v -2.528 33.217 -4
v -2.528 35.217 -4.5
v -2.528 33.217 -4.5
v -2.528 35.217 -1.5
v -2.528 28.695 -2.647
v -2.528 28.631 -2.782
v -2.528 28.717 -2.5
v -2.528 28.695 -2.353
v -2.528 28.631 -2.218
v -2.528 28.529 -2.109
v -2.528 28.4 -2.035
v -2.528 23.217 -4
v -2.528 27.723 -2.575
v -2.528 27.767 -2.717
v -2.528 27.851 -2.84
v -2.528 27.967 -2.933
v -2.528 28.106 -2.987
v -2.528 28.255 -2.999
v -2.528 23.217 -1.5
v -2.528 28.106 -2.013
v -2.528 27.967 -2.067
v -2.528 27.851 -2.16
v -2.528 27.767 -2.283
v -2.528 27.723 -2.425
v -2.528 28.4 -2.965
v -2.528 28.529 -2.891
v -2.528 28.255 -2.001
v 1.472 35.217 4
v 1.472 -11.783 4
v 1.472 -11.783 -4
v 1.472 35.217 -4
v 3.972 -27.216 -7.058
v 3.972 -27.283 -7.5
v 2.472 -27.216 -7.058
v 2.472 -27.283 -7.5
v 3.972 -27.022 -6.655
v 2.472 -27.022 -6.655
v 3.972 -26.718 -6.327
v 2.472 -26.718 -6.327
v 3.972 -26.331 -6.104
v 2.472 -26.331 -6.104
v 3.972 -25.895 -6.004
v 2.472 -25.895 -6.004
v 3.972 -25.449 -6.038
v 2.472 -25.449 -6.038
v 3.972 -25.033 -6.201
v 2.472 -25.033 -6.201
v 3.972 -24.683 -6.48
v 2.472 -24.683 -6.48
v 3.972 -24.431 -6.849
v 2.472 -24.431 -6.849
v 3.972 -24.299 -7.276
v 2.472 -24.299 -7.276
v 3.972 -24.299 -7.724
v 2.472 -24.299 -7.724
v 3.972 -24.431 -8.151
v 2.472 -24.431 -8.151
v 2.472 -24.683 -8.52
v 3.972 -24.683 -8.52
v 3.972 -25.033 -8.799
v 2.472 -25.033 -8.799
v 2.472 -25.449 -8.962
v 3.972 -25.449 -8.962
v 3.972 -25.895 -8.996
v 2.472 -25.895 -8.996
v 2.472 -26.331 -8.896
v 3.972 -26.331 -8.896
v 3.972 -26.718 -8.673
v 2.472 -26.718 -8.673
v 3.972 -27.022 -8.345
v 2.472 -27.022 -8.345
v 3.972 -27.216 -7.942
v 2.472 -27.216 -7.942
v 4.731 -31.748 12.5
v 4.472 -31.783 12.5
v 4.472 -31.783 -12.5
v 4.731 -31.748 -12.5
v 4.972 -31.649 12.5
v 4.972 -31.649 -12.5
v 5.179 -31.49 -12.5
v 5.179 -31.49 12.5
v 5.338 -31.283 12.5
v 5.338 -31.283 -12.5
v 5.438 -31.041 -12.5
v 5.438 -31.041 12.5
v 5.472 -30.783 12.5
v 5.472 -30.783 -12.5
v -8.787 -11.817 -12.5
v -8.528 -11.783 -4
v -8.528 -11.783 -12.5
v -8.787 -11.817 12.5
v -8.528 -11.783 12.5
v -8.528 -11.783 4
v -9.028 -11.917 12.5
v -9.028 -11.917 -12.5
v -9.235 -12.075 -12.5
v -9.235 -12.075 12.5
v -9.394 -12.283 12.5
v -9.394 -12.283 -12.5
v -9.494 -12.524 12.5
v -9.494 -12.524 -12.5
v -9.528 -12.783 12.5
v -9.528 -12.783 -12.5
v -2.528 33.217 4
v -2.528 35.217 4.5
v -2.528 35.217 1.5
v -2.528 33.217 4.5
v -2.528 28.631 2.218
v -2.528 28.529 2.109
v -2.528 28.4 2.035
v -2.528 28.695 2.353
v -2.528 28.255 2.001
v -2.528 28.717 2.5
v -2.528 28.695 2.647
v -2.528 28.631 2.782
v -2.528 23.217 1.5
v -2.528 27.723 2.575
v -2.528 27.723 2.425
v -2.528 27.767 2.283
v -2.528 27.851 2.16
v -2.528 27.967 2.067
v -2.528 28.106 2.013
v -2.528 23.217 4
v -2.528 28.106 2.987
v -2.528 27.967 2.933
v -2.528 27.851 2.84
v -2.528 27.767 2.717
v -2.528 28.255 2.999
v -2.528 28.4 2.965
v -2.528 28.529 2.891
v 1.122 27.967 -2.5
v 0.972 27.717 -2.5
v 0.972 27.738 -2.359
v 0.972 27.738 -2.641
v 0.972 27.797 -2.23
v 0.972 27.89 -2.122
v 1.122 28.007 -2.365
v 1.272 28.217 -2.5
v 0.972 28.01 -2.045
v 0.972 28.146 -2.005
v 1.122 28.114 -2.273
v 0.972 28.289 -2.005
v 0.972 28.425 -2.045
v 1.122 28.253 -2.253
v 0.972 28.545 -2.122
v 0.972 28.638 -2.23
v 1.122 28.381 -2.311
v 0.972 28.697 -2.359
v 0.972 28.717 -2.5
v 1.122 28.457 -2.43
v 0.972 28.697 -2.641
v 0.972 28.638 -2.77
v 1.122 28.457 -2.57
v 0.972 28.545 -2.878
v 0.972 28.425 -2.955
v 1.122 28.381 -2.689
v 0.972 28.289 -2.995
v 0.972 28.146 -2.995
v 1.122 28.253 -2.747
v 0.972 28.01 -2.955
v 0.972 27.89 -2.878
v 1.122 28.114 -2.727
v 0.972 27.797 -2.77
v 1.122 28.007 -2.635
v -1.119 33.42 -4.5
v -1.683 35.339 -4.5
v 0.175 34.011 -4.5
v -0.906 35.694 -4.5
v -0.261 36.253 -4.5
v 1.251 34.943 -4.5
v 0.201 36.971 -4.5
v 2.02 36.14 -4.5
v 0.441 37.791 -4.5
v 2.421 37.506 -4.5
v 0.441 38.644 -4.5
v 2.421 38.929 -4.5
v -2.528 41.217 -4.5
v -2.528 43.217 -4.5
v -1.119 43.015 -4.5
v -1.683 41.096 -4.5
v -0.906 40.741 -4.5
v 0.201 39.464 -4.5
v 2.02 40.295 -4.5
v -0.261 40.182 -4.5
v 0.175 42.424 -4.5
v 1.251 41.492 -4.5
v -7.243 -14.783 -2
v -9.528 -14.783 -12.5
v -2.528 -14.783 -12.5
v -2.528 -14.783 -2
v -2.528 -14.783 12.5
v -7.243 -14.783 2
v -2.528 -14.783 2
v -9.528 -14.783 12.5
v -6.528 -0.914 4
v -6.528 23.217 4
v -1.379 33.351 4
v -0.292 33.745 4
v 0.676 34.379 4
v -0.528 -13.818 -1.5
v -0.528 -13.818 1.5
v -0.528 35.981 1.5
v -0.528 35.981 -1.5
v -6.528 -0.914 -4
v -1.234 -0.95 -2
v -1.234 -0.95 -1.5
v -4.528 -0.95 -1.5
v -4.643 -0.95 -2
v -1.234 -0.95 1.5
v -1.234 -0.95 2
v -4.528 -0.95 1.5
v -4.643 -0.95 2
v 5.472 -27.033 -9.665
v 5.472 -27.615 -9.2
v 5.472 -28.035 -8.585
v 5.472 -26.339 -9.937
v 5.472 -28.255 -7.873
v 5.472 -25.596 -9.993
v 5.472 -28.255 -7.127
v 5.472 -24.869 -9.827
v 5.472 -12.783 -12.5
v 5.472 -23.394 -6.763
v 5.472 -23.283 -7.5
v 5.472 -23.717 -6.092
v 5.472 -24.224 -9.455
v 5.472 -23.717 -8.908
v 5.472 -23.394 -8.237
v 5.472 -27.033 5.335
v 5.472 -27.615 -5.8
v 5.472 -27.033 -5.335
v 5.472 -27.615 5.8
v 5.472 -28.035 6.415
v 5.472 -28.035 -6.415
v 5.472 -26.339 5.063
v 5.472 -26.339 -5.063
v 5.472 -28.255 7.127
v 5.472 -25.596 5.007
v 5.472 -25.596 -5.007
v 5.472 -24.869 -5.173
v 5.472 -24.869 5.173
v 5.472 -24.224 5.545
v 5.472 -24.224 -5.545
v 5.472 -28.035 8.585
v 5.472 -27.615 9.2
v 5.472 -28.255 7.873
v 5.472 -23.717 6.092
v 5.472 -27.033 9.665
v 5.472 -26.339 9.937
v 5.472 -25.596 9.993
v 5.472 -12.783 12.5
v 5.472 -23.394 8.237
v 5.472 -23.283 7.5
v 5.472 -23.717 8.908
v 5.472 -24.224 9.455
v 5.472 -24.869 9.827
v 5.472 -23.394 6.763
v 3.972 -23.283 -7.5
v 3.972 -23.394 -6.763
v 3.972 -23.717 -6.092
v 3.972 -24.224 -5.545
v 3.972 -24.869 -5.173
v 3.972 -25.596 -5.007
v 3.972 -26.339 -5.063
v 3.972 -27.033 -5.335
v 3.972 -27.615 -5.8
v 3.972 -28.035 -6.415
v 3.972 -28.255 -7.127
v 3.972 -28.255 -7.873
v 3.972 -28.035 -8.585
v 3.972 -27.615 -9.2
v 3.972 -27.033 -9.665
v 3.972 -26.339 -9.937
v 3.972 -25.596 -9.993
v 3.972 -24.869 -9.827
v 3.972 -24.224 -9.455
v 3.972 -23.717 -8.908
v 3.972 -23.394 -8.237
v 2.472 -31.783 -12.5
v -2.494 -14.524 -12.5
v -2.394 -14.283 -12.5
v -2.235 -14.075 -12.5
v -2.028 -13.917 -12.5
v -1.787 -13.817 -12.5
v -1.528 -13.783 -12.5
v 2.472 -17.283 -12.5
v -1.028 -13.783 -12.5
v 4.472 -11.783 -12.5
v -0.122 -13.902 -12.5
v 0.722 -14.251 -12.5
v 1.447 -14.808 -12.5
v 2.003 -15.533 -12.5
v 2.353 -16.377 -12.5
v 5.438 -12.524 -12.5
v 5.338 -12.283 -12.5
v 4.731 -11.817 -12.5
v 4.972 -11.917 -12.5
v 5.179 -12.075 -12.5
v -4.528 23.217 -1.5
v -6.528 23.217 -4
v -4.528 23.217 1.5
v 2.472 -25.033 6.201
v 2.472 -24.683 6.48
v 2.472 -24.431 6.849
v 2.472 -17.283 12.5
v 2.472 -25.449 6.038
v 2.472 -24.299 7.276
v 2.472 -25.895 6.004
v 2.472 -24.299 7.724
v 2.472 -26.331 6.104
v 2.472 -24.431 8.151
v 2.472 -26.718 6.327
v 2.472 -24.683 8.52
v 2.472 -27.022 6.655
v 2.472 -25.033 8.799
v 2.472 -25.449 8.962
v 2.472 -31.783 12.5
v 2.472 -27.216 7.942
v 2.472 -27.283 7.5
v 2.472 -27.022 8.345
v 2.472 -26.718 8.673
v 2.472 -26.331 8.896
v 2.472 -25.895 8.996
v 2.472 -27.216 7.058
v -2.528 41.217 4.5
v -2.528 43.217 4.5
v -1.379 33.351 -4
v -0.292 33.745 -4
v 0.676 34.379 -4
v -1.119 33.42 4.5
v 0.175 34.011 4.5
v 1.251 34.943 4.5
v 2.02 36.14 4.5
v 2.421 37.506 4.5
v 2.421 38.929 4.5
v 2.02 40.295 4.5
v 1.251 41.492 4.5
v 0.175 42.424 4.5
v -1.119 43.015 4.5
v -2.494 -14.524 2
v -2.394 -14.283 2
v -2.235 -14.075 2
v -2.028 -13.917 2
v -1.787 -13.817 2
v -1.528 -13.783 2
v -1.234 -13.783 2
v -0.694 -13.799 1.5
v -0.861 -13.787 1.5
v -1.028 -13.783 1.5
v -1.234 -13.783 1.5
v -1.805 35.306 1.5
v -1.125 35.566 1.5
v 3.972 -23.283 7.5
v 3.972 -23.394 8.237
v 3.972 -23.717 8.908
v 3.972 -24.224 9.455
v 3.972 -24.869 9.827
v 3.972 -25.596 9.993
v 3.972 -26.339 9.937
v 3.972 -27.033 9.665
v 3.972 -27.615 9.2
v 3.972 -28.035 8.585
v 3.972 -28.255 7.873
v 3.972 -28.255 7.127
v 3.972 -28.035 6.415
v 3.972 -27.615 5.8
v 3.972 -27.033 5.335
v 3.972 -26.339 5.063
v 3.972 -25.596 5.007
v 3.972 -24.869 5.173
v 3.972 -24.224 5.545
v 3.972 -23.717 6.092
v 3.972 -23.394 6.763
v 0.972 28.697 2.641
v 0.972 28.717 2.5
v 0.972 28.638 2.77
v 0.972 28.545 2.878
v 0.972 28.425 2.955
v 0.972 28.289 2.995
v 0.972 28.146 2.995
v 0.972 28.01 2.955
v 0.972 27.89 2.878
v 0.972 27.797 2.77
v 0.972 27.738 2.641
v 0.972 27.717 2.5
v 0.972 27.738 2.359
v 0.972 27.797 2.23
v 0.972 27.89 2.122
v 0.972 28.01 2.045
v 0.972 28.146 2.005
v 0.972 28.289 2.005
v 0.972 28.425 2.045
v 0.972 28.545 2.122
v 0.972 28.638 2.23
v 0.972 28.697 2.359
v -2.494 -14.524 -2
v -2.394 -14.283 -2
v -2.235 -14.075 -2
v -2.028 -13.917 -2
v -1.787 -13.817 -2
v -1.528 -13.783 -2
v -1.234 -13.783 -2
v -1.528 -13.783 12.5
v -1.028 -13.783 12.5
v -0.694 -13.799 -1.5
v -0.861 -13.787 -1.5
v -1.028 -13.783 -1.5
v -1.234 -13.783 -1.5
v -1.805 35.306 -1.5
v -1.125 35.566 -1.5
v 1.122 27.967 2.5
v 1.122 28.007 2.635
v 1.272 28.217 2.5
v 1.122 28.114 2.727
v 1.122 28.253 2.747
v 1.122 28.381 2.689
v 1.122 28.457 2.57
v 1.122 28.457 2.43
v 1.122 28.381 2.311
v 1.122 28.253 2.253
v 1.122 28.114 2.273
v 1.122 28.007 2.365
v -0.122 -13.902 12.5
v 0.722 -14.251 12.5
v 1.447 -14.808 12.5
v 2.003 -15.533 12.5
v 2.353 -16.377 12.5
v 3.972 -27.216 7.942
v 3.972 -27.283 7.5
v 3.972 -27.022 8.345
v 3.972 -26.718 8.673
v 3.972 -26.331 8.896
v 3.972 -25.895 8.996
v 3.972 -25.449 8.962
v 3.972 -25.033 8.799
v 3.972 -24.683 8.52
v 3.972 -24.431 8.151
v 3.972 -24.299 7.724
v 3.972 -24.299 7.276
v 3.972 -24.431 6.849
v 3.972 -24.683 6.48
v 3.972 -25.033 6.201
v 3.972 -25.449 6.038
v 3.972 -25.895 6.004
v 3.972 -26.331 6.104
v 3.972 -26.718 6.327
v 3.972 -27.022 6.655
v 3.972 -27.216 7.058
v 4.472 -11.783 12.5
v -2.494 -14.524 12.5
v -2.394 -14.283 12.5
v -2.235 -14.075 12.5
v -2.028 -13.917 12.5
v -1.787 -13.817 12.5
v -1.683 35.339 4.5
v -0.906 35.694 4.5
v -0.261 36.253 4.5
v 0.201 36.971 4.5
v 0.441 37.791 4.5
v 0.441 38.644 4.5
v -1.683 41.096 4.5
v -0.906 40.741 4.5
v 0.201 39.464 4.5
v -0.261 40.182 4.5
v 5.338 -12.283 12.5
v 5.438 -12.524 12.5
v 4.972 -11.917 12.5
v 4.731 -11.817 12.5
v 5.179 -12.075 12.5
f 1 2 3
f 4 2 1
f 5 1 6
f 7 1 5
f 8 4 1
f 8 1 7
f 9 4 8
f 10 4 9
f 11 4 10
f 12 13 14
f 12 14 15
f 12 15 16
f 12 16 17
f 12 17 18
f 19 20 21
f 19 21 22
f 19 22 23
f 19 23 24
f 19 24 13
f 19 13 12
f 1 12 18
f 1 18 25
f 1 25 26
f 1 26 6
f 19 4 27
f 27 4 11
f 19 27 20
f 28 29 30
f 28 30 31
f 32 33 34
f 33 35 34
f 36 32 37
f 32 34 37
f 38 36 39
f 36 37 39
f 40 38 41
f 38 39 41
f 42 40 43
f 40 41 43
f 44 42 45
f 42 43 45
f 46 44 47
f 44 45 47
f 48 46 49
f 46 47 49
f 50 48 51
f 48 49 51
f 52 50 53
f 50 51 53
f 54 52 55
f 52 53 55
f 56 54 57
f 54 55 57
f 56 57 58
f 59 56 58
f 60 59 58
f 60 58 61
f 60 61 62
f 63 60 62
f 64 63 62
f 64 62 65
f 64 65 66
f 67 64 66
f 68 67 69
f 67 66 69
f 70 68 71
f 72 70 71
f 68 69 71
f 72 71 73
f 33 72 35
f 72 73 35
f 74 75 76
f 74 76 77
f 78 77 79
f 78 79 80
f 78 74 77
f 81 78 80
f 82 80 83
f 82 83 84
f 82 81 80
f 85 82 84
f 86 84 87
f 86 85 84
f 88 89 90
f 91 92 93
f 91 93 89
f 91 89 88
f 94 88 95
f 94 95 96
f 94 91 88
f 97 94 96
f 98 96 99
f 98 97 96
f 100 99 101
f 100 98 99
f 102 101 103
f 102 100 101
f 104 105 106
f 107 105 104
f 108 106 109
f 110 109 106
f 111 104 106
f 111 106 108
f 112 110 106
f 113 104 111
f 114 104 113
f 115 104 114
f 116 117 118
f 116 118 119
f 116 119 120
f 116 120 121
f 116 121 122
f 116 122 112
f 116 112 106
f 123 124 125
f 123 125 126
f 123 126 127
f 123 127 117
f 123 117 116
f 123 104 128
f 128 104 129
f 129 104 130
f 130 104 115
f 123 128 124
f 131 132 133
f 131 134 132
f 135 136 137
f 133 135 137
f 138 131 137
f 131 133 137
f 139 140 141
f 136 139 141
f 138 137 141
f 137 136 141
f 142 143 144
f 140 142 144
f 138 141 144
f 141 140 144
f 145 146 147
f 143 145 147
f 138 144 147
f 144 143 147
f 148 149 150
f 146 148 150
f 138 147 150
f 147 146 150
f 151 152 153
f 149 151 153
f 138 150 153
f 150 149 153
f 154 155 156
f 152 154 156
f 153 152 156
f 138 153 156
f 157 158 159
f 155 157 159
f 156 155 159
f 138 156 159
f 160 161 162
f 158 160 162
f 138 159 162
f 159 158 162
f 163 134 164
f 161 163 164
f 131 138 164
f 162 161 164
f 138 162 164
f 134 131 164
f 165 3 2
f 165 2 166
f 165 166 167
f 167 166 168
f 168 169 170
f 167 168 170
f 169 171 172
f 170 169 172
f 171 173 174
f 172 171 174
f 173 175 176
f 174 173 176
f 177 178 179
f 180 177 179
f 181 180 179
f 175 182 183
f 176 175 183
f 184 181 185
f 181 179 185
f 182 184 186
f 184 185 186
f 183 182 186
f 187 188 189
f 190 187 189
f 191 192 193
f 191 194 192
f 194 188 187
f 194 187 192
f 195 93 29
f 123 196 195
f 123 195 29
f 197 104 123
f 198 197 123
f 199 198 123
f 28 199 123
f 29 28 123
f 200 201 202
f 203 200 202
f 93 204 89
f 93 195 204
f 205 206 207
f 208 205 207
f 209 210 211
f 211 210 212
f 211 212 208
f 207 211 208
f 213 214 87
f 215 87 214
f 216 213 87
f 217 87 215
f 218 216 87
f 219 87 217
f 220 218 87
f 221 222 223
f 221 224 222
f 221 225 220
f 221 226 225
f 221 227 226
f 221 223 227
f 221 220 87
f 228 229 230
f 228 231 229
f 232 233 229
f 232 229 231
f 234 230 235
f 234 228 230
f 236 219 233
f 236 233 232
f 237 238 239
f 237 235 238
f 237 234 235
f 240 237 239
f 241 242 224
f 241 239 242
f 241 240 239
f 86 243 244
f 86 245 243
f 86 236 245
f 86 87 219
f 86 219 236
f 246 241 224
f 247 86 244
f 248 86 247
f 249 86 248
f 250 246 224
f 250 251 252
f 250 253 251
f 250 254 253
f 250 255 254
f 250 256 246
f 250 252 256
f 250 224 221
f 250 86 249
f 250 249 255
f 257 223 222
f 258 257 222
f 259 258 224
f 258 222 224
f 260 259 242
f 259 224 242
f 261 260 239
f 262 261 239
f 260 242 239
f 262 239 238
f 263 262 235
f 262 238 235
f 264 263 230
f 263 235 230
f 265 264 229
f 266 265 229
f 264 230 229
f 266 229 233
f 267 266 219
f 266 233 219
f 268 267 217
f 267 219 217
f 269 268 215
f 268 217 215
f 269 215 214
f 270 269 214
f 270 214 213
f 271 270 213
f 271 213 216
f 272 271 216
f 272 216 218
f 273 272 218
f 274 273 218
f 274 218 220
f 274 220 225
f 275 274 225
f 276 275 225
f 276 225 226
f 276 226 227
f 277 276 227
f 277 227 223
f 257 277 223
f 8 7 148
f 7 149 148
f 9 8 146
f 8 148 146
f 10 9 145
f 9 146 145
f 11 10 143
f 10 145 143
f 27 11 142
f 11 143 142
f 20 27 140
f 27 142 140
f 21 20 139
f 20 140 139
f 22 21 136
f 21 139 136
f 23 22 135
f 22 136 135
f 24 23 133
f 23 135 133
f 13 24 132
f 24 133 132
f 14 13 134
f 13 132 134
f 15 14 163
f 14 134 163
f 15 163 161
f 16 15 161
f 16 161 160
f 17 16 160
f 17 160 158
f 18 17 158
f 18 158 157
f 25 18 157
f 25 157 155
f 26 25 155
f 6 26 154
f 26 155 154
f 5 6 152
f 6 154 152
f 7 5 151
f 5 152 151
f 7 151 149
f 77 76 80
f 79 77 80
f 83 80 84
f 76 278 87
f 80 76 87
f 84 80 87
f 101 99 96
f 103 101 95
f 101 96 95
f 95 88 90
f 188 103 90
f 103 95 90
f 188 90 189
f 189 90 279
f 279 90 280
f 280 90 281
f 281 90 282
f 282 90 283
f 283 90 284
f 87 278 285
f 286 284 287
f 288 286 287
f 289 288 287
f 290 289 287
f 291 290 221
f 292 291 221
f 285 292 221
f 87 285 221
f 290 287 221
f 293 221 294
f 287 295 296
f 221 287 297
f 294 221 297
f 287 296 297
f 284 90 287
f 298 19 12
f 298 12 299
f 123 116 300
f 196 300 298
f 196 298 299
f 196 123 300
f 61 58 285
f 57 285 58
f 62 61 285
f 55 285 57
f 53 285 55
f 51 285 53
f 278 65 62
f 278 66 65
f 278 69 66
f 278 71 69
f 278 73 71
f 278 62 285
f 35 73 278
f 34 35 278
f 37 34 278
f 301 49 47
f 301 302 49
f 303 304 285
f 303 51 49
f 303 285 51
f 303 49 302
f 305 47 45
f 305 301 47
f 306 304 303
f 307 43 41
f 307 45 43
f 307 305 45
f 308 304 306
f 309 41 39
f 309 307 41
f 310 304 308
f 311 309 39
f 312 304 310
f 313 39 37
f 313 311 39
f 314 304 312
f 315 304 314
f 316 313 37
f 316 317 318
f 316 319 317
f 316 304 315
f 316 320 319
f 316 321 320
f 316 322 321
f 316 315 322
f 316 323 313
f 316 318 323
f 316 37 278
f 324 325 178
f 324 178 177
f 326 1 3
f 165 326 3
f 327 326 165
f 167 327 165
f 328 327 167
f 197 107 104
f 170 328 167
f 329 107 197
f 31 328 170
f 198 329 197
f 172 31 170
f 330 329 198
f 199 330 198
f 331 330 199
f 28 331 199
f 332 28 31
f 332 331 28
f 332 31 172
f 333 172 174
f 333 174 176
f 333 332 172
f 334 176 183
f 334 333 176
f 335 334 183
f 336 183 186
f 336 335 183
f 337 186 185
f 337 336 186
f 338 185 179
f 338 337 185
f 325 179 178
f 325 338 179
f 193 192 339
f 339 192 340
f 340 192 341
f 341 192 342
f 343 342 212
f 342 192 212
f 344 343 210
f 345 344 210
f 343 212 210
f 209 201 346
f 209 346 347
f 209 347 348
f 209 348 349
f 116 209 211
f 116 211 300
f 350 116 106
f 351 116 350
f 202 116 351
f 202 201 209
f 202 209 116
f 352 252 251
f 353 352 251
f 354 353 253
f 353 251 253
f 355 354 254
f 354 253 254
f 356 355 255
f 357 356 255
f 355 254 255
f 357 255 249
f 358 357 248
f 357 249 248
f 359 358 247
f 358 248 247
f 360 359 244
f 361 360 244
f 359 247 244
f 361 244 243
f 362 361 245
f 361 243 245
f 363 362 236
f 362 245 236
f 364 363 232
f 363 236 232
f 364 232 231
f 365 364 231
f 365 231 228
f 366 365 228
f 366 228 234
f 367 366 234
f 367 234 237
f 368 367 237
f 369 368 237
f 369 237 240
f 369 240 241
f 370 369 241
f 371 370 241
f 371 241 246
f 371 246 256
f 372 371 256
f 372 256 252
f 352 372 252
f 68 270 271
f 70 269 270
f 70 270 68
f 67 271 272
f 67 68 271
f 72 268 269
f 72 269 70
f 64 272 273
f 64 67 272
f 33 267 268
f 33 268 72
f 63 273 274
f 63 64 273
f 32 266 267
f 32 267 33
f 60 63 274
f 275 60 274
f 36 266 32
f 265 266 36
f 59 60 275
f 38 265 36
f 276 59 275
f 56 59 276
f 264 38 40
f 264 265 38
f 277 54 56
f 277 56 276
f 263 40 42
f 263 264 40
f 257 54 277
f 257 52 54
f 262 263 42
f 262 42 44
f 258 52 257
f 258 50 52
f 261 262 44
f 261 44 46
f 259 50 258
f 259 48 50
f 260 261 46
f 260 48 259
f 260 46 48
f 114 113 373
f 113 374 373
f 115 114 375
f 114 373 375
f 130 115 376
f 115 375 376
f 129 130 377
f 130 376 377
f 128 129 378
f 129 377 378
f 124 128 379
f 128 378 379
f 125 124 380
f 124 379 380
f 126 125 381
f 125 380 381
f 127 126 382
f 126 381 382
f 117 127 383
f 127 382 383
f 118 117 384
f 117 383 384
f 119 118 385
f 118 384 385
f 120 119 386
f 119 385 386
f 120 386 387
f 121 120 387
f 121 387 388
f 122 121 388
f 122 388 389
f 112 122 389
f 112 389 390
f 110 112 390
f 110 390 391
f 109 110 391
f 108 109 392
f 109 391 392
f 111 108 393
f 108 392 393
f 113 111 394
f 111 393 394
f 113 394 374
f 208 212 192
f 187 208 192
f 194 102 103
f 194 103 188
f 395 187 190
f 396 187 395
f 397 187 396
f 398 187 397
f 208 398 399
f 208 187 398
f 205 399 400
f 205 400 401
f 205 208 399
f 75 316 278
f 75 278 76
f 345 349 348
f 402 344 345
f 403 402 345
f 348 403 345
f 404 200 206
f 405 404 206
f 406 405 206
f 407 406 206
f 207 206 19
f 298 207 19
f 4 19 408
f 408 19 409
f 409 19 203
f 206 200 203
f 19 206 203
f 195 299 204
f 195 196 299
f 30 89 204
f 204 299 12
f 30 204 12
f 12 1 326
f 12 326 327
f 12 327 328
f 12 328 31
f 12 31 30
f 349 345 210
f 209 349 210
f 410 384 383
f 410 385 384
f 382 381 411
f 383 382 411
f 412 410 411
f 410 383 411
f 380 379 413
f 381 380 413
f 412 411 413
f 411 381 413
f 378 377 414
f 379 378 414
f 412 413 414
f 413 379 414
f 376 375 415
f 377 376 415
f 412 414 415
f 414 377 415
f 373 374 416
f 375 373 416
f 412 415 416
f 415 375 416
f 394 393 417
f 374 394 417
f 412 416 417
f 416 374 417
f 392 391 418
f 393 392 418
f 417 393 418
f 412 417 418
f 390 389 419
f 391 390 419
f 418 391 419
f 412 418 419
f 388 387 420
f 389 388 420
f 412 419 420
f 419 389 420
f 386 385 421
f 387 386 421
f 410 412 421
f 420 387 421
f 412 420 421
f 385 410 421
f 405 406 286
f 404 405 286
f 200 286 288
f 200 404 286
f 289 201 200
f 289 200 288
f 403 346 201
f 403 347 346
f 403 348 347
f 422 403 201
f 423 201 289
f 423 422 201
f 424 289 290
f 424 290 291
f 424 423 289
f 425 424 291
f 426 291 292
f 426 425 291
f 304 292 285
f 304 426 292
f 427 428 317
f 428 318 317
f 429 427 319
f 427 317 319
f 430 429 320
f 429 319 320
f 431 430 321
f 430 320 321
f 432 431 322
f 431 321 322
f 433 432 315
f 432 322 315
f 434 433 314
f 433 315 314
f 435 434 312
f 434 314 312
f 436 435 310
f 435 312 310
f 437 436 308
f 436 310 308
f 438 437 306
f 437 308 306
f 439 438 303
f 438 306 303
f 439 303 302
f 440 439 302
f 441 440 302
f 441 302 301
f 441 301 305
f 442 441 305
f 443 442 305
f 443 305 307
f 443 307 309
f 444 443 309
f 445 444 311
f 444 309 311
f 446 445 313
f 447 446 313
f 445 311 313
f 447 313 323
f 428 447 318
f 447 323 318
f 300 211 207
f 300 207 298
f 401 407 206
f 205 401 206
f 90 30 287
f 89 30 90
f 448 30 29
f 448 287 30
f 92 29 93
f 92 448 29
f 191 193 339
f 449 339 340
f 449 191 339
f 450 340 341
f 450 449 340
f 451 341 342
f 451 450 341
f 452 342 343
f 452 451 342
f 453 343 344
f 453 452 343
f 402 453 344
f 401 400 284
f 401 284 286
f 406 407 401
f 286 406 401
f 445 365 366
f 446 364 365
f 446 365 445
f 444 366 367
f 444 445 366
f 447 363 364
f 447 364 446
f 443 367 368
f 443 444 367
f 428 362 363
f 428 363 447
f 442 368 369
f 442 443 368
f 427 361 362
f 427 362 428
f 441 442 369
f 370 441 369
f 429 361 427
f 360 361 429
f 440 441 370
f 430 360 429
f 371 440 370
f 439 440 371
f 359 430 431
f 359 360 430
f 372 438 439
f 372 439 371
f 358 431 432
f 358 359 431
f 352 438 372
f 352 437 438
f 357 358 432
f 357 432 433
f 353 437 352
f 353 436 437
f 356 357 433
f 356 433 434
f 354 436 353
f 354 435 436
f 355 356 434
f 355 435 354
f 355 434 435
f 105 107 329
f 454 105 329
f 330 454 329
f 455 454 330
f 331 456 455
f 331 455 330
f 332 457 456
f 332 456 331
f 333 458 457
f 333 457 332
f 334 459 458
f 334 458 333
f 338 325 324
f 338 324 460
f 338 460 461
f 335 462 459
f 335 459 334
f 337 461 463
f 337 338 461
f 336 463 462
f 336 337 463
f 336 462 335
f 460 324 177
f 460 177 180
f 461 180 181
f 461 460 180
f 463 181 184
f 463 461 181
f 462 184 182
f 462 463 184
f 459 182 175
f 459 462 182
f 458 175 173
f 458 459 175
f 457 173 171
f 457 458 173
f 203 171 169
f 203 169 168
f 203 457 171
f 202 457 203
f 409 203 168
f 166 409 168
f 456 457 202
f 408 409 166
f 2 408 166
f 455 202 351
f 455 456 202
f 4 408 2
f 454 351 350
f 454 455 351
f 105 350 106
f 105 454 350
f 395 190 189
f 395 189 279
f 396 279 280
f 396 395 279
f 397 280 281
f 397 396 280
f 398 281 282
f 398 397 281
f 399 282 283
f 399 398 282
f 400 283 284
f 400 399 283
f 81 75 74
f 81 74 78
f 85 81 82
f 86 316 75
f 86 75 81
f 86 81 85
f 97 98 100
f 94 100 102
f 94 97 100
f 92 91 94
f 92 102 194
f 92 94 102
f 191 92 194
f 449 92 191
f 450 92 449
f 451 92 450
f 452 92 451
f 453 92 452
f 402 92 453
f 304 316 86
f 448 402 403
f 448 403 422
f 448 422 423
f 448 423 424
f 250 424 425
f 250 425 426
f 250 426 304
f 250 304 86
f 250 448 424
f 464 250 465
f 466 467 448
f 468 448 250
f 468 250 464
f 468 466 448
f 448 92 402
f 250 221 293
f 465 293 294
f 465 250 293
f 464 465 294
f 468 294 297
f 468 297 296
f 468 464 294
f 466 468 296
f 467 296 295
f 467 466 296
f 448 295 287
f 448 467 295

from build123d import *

# Parameters (mm, degrees)
F1_DEPTH       = 12.5
F3_D           = 3
F3_CBORE_D     = 5
F3_CBORE_DEPTH = 1.5
F4_DEPTH       = 4
F5_DEPTH       = 4.5
F7_W           = 52.7206266809
F7_H           = 3
F8_DEPTH       = 2
F10_DEPTH      = 2
F12_D          = 1
F12_DEPTH      = 3.5
F12_TIP        = 0.3004303095


with BuildPart() as f1:
    # F0 (on Top) → F1 (new body, symmetric)
    with BuildSketch(Plane.XY):
        with BuildLine():
            Line((-6.5277831331, -11.7825440413), (-8.5277831331, -11.7825440413))
            ThreePointArc((-8.5277831331, -11.7825440413), (-9.2348899143, -12.0754372601), (-9.5277831331, -12.7825440413))
            Line((-9.5277831331, -12.7825440413), (-9.5277831331, -14.7825440413))
            Line((-9.5277831331, -14.7825440413), (-2.5277831331, -14.7825440413))
            ThreePointArc((-2.5277831331, -14.7825440413), (-2.2348899143, -14.0754372601), (-1.5277831331, -13.7825440413))
            Line((-1.5277831331, -13.7825440413), (-1.0277831331, -13.7825440413))
            ThreePointArc((-1.0277831331, -13.7825440413), (1.4470906011, -14.8076703072), (2.4722168669, -17.2825440413))
            Line((2.4722168669, -17.2825440413), (2.4722168669, -31.7825440413))
            Line((2.4722168669, -31.7825440413), (4.4722168669, -31.7825440413))
            ThreePointArc((4.4722168669, -31.7825440413), (5.1793236481, -31.4896508225), (5.4722168669, -30.7825440413))
            Line((5.4722168669, -30.7825440413), (5.4722168669, -12.7825440413))
            ThreePointArc((5.4722168669, -12.7825440413), (5.1793236481, -12.0754372601), (4.4722168669, -11.7825440413))
            Line((4.4722168669, -11.7825440413), (1.472, -11.7825440413))
            Line((1.472, -11.7825440413), (-6.5277831331, -11.7825440413))
        make_face()
    extrude(amount=F1_DEPTH, both=True)

    # F3 (through all)
    with Locations(Plane.YZ.offset(5.4722168669)):
        with Locations((-25.7825440413, 7.5), (-25.7825440413, -7.5)):
            CounterBoreHole(F3_D / 2, F3_CBORE_D / 2, F3_CBORE_DEPTH)

    # F0 (on Top) → F4 (join, symmetric)
    with BuildSketch(Plane.XY):
        with BuildLine():
            Line((-6.528, -0.9138678433), (-8.5277831331, -11.7825440413))
            Line((-8.5277831331, -11.7825440413), (-6.5277831331, -11.7825440413))
            Line((-6.5277831331, -11.7825440413), (1.472, -11.7825440413))
            Line((1.472, -11.7825440413), (1.472, 35.2174559587))
            ThreePointArc((1.472, 35.2174559587), (-0.2919320225, 33.7453200037), (-2.528, 33.2174559587))
            Line((-2.528, 33.2174559587), (-2.528, 23.2174559587))
            Line((-2.528, 23.2174559587), (-6.528, 23.2174559587))
            Line((-6.528, 23.2174559587), (-6.528, -0.9138678433))
        make_face()
    extrude(amount=F4_DEPTH, both=True)

    # F0 (on Top) → F5 (join, symmetric)
    with BuildSketch(Plane.XY):
        with BuildLine():
            ThreePointArc((-2.528, 33.2174559587), (-0.2919320225, 33.7453200037), (1.472, 35.2174559587))
            ThreePointArc((1.472, 35.2174559587), (1.944135955, 40.4535239362), (-2.528, 43.2174559587))
            Line((-2.528, 43.2174559587), (-2.528, 41.2174559587))
            ThreePointArc((-2.528, 41.2174559587), (0.472, 38.2174559587), (-2.528, 35.2174559587))
            Line((-2.528, 35.2174559587), (-2.528, 33.2174559587))
        make_face()
    extrude(amount=F5_DEPTH, both=True)

    # F7 (on offset) → F8 (cut, symmetric)
    with BuildSketch(Plane.YZ.offset(-2.528)):
        with Locations((10.1688103074, 0)):
            Rectangle(F7_W, F7_H)
    extrude(amount=F8_DEPTH, both=True, mode=Mode.SUBTRACT)

    # F9 (on Top) → F10 (cut, symmetric)
    with BuildSketch(Plane.XY):
        Polygon((-1.2336979853, -0.9498164291), (-4.6429014765, -0.9498164291), (-7.5818696059, -16.5851321071), (-1.2336979853, -16.5851321071), align=None)
    extrude(amount=F10_DEPTH, both=True, mode=Mode.SUBTRACT)

    # F12
    with Locations(Plane(origin=(-2.528, 0, 0), x_dir=(0, -1, 0), z_dir=(-1, 0, 0))):
        with Locations((-28.2174559587, -2.5), (-28.2174559587, 2.5)):
            Hole(F12_D / 2, depth=F12_DEPTH)
            with Locations((0, 0, -(F12_DEPTH + F12_TIP / 2))):  # 118° drill point
                Cone(0, F12_D / 2, F12_TIP, mode=Mode.SUBTRACT)


solid = f1.part
